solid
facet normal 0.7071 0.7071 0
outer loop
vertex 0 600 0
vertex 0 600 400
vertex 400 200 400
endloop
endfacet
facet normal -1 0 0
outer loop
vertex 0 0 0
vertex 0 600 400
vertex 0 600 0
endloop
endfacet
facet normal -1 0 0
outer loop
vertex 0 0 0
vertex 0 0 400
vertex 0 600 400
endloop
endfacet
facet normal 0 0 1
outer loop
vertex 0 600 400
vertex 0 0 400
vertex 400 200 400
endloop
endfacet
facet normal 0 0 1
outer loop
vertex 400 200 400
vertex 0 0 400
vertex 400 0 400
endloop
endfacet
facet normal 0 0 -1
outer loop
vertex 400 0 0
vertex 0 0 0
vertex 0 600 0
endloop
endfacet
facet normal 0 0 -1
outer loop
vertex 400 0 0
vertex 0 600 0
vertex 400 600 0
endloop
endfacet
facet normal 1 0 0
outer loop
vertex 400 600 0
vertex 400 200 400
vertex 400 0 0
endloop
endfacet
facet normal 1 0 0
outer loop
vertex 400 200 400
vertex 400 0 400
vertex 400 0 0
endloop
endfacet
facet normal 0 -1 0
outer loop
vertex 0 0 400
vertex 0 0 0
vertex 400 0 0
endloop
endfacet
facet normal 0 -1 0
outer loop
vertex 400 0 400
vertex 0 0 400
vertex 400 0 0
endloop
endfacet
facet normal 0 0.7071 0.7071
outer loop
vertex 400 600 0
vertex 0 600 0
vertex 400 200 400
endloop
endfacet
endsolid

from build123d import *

# Parameters (mm, degrees)
SKIZZE1_W                       = 400
SKIZZE1_H                       = 400
AUFSATZ_LINEAR_AUSTRAGEN1_DEPTH = 200
SKIZZE2_W                       = 400
SKIZZE2_H                       = 400
AUFSATZ_LINEAR_AUSTRAGEN2_DEPTH = 400
SKIZZE3_W                       = 400
SKIZZE3_H                       = 400
SCHNITT_LINEAR_AUSTRAGEN1_DEPTH = 1040.962535349


with BuildPart() as part:
    # Skizze1 → Aufsatz-Linear austragen1 (new body)
    with BuildSketch(Plane(origin=(0, 0, 0), x_dir=(1, 0, 0), z_dir=(0, 1, 0))):
        with Locations((200, -200)):
            Rectangle(SKIZZE1_W, SKIZZE1_H)
    extrude(amount=AUFSATZ_LINEAR_AUSTRAGEN1_DEPTH)

    # Skizze2 → Aufsatz-Linear austragen2 (add)
    with BuildSketch(Plane(origin=(0, 200, 0), x_dir=(1, 0, 0), z_dir=(0, 1, 0))):
        with Locations((200, -200)):
            Rectangle(SKIZZE2_W, SKIZZE2_H)
    extrude(amount=AUFSATZ_LINEAR_AUSTRAGEN2_DEPTH)

    # Skizze3 → Schnitt-Linear austragen1 (cut, through all, along a direction that is not the sketch's normal)
    with BuildSketch(Plane(origin=(0, 600, 0), x_dir=(1, 0, 0), z_dir=(0, 1, 0))):
        with Locations((200, -200)):
            Rectangle(SKIZZE3_W, SKIZZE3_H)
    extrude(amount=-SCHNITT_LINEAR_AUSTRAGEN1_DEPTH, dir=(-0.577350269, 0.577350269, -0.577350269), mode=Mode.SUBTRACT)


solid = part.part
